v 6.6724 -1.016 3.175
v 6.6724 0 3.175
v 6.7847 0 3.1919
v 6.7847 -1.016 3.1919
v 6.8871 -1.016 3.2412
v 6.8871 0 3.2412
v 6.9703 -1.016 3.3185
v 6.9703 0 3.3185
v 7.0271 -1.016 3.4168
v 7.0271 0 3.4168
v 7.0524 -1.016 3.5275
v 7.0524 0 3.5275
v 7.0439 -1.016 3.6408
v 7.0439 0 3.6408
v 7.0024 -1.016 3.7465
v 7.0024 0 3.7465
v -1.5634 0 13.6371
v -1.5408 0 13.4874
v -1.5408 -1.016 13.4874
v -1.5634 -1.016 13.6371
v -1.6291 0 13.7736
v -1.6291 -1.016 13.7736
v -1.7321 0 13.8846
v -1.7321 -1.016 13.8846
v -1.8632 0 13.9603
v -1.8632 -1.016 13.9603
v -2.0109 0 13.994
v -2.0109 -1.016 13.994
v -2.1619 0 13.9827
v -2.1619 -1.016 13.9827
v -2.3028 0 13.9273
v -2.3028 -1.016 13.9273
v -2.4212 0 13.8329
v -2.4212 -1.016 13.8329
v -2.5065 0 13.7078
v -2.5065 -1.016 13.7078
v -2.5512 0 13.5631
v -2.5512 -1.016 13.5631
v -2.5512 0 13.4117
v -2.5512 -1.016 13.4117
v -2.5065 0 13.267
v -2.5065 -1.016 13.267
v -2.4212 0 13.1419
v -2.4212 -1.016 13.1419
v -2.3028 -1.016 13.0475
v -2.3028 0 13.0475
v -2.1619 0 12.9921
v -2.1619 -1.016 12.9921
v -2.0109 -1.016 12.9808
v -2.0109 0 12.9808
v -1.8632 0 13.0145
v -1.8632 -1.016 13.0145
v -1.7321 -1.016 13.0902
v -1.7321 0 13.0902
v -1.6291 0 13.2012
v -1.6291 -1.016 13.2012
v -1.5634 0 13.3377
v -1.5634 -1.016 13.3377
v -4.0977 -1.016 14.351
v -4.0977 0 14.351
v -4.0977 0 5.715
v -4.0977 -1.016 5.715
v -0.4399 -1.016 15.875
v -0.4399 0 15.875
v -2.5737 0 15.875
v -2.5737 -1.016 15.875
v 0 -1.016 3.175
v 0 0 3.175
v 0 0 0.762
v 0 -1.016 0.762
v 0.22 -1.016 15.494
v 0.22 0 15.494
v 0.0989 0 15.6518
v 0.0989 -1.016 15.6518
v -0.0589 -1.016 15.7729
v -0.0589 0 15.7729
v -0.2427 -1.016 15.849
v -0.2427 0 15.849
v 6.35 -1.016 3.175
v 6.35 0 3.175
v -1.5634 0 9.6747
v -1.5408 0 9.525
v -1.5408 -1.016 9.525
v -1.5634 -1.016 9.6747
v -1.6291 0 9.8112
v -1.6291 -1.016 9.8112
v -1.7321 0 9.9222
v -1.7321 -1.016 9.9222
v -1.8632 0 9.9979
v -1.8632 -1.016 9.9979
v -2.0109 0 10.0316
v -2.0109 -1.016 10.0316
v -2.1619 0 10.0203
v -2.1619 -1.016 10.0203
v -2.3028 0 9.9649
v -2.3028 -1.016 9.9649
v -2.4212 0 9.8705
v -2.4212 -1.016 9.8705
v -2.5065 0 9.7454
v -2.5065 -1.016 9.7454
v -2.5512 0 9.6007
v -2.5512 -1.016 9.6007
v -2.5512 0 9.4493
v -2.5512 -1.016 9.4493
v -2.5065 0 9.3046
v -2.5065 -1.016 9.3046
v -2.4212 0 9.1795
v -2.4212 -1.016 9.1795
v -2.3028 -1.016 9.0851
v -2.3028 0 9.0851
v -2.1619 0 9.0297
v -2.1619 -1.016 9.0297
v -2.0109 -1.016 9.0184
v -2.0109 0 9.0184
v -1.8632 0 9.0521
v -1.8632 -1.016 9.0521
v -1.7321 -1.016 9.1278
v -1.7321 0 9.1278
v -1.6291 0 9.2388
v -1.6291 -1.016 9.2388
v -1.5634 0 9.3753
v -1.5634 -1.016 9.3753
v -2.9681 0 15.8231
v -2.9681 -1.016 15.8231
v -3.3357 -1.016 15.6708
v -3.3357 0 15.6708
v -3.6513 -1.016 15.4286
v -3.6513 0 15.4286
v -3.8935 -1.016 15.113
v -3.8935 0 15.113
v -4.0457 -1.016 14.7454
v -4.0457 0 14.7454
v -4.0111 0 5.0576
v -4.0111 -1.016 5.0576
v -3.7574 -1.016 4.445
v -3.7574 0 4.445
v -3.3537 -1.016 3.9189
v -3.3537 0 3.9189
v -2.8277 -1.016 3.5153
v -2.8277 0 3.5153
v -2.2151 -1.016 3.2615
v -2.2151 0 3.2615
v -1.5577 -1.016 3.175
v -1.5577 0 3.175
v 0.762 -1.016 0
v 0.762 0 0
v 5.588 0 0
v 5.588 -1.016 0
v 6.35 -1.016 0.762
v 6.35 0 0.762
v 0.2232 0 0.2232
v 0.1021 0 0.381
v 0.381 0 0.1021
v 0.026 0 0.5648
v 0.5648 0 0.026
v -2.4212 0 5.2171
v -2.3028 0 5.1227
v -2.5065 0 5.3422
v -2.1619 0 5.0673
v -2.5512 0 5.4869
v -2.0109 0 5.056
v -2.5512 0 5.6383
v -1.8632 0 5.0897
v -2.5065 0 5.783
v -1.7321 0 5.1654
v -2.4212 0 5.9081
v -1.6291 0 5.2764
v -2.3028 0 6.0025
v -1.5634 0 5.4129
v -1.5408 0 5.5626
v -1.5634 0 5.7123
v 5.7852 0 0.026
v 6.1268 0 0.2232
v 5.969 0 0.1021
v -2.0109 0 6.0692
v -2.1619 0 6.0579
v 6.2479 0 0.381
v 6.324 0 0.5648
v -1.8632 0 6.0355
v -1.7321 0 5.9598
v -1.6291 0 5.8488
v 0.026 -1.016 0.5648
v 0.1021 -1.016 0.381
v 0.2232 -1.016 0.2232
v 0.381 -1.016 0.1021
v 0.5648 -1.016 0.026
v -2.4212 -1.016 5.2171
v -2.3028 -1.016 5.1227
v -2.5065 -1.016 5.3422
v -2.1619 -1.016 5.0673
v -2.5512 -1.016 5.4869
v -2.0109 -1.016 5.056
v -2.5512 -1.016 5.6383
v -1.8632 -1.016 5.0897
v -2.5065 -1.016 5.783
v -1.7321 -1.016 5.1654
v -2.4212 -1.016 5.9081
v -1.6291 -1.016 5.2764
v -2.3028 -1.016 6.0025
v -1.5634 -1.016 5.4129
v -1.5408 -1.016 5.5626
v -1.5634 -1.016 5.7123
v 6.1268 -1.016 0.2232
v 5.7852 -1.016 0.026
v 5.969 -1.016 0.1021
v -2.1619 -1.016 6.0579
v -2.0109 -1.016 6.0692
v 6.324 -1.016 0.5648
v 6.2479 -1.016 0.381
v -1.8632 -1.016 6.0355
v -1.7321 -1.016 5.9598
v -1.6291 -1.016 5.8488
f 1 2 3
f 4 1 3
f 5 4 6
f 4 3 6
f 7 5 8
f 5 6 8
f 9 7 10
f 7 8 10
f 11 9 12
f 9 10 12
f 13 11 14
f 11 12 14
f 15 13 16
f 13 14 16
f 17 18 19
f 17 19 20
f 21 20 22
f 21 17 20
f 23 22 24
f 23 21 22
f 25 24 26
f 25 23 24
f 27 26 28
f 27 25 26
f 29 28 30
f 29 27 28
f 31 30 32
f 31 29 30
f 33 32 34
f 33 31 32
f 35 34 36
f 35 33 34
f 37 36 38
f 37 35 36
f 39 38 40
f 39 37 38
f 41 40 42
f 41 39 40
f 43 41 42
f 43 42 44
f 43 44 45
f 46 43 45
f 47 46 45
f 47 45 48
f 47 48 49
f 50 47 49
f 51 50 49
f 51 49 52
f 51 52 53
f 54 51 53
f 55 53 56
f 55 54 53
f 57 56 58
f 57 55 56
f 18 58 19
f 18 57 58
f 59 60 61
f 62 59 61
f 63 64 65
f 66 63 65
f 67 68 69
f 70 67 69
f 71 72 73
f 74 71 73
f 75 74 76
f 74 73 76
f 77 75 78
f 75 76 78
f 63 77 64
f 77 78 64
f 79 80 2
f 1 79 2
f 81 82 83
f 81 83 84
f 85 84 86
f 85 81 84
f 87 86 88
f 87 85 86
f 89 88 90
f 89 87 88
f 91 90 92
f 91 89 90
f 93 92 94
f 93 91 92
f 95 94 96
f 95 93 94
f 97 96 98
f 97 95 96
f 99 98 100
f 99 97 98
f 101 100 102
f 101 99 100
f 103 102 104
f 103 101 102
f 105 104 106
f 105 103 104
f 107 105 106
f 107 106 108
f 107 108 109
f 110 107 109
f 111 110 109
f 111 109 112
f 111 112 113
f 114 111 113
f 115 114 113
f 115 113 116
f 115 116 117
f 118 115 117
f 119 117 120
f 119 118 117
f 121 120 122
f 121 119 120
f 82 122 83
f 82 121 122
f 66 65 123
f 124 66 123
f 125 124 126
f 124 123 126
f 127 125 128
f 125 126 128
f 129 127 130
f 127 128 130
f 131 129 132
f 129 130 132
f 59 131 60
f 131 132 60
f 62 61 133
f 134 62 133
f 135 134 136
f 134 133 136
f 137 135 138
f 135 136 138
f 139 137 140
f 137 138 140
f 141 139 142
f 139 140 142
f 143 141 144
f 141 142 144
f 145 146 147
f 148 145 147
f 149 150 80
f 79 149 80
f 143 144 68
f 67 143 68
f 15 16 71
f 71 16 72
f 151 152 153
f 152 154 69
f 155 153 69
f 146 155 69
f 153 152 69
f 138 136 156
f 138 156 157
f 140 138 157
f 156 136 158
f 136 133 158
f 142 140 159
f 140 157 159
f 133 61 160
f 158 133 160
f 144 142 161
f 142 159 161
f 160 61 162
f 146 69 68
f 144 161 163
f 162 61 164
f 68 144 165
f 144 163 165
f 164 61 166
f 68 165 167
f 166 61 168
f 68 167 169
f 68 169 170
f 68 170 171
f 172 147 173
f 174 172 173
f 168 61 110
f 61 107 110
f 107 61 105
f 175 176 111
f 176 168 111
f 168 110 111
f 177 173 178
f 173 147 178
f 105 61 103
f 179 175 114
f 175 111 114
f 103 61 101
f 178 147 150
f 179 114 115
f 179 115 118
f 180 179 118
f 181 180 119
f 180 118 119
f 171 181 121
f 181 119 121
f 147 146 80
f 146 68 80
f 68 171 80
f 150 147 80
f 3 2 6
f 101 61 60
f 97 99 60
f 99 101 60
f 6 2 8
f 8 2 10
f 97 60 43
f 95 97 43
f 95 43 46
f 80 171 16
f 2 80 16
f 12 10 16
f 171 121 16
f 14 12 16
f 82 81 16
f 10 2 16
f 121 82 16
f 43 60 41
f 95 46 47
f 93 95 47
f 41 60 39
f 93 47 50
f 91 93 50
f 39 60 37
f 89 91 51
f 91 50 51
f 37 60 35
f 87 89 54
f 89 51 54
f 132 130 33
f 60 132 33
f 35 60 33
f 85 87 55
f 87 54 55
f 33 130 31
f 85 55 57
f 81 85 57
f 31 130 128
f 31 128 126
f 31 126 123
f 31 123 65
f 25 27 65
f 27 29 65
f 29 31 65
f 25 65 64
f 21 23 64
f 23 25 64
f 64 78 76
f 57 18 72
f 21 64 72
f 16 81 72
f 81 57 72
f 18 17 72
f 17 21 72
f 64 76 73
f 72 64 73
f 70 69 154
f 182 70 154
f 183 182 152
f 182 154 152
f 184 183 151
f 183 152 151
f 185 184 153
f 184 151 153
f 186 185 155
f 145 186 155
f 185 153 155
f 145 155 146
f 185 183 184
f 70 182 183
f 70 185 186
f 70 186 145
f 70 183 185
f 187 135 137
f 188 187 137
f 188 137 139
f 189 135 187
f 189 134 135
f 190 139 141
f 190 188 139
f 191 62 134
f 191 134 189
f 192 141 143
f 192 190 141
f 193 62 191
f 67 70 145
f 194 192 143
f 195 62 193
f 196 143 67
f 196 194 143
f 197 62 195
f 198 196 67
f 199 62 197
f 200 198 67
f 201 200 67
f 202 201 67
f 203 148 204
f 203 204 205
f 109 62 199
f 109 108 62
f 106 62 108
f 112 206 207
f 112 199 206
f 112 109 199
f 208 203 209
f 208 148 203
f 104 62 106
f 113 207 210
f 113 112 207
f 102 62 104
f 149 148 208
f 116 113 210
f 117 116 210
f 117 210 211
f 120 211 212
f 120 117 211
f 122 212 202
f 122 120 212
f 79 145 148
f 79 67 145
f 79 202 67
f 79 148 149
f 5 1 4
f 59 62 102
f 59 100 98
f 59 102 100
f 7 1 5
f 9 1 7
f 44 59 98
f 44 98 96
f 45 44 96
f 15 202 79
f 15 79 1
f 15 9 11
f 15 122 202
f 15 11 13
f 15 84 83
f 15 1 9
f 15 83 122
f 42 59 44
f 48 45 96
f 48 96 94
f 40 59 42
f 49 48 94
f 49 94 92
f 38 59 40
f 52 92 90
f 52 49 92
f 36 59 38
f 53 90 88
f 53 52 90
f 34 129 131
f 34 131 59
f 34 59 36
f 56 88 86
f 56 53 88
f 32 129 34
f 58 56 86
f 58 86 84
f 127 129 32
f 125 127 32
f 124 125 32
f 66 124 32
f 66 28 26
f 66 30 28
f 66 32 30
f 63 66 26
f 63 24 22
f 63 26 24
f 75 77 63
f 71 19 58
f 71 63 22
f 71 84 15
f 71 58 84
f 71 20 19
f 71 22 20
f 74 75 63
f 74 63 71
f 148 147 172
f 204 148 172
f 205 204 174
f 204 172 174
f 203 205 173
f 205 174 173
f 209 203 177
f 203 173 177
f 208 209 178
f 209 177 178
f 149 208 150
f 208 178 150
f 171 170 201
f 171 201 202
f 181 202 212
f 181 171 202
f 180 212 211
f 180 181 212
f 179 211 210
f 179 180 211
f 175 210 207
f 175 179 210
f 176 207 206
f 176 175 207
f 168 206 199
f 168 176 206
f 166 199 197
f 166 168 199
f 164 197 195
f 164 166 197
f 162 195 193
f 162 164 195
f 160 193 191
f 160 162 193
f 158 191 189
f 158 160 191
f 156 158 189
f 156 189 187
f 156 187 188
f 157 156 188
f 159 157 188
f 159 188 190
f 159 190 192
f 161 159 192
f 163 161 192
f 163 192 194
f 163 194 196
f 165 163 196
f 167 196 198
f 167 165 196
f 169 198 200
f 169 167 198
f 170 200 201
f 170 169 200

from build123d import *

# Parameters (mm, degrees)
F0_R     = 0.508
F1_DEPTH = 1.016


with BuildPart() as f1:
    # F0 (on Front) → F1 (new body)
    with BuildSketch(Plane.XZ):
        with BuildLine():
            Line((0, 3.175), (0, 0.762))
            ThreePointArc((0, 0.762), (0.223185, 0.223185), (0.762, 0))
            Line((0.762, 0), (5.588, 0))
            ThreePointArc((5.588, 0), (6.126815, 0.223185), (6.35, 0.762))
            Line((6.35, 0.762), (6.35, 3.175))
            Line((6.35, 3.175), (6.672437, 3.175))
            ThreePointArc((6.672437, 3.175), (7.002393, 3.3655), (7.002393, 3.7465))
            Line((7.002393, 3.7465), (0.21997, 15.494))
            ThreePointArc((0.21997, 15.494), (-0.058941, 15.772911), (-0.439941, 15.875))
            Line((-0.439941, 15.875), (-2.573652, 15.875))
            ThreePointArc((-2.573652, 15.875), (-3.651282, 15.428631), (-4.097652, 14.351))
            Line((-4.097652, 14.351), (-4.097652, 5.715))
            ThreePointArc((-4.097652, 5.715), (-3.353703, 3.918949), (-1.557652, 3.175))
            Line((-1.557652, 3.175), (0, 3.175))
        make_face()
        with Locations((-2.048826, 5.5626)):
            Circle(F0_R, mode=Mode.SUBTRACT)
        with Locations((-2.048826, 9.525)):
            Circle(F0_R, mode=Mode.SUBTRACT)
        with Locations((-2.048826, 13.4874)):
            Circle(F0_R, mode=Mode.SUBTRACT)
    extrude(amount=F1_DEPTH)


solid = f1.part
